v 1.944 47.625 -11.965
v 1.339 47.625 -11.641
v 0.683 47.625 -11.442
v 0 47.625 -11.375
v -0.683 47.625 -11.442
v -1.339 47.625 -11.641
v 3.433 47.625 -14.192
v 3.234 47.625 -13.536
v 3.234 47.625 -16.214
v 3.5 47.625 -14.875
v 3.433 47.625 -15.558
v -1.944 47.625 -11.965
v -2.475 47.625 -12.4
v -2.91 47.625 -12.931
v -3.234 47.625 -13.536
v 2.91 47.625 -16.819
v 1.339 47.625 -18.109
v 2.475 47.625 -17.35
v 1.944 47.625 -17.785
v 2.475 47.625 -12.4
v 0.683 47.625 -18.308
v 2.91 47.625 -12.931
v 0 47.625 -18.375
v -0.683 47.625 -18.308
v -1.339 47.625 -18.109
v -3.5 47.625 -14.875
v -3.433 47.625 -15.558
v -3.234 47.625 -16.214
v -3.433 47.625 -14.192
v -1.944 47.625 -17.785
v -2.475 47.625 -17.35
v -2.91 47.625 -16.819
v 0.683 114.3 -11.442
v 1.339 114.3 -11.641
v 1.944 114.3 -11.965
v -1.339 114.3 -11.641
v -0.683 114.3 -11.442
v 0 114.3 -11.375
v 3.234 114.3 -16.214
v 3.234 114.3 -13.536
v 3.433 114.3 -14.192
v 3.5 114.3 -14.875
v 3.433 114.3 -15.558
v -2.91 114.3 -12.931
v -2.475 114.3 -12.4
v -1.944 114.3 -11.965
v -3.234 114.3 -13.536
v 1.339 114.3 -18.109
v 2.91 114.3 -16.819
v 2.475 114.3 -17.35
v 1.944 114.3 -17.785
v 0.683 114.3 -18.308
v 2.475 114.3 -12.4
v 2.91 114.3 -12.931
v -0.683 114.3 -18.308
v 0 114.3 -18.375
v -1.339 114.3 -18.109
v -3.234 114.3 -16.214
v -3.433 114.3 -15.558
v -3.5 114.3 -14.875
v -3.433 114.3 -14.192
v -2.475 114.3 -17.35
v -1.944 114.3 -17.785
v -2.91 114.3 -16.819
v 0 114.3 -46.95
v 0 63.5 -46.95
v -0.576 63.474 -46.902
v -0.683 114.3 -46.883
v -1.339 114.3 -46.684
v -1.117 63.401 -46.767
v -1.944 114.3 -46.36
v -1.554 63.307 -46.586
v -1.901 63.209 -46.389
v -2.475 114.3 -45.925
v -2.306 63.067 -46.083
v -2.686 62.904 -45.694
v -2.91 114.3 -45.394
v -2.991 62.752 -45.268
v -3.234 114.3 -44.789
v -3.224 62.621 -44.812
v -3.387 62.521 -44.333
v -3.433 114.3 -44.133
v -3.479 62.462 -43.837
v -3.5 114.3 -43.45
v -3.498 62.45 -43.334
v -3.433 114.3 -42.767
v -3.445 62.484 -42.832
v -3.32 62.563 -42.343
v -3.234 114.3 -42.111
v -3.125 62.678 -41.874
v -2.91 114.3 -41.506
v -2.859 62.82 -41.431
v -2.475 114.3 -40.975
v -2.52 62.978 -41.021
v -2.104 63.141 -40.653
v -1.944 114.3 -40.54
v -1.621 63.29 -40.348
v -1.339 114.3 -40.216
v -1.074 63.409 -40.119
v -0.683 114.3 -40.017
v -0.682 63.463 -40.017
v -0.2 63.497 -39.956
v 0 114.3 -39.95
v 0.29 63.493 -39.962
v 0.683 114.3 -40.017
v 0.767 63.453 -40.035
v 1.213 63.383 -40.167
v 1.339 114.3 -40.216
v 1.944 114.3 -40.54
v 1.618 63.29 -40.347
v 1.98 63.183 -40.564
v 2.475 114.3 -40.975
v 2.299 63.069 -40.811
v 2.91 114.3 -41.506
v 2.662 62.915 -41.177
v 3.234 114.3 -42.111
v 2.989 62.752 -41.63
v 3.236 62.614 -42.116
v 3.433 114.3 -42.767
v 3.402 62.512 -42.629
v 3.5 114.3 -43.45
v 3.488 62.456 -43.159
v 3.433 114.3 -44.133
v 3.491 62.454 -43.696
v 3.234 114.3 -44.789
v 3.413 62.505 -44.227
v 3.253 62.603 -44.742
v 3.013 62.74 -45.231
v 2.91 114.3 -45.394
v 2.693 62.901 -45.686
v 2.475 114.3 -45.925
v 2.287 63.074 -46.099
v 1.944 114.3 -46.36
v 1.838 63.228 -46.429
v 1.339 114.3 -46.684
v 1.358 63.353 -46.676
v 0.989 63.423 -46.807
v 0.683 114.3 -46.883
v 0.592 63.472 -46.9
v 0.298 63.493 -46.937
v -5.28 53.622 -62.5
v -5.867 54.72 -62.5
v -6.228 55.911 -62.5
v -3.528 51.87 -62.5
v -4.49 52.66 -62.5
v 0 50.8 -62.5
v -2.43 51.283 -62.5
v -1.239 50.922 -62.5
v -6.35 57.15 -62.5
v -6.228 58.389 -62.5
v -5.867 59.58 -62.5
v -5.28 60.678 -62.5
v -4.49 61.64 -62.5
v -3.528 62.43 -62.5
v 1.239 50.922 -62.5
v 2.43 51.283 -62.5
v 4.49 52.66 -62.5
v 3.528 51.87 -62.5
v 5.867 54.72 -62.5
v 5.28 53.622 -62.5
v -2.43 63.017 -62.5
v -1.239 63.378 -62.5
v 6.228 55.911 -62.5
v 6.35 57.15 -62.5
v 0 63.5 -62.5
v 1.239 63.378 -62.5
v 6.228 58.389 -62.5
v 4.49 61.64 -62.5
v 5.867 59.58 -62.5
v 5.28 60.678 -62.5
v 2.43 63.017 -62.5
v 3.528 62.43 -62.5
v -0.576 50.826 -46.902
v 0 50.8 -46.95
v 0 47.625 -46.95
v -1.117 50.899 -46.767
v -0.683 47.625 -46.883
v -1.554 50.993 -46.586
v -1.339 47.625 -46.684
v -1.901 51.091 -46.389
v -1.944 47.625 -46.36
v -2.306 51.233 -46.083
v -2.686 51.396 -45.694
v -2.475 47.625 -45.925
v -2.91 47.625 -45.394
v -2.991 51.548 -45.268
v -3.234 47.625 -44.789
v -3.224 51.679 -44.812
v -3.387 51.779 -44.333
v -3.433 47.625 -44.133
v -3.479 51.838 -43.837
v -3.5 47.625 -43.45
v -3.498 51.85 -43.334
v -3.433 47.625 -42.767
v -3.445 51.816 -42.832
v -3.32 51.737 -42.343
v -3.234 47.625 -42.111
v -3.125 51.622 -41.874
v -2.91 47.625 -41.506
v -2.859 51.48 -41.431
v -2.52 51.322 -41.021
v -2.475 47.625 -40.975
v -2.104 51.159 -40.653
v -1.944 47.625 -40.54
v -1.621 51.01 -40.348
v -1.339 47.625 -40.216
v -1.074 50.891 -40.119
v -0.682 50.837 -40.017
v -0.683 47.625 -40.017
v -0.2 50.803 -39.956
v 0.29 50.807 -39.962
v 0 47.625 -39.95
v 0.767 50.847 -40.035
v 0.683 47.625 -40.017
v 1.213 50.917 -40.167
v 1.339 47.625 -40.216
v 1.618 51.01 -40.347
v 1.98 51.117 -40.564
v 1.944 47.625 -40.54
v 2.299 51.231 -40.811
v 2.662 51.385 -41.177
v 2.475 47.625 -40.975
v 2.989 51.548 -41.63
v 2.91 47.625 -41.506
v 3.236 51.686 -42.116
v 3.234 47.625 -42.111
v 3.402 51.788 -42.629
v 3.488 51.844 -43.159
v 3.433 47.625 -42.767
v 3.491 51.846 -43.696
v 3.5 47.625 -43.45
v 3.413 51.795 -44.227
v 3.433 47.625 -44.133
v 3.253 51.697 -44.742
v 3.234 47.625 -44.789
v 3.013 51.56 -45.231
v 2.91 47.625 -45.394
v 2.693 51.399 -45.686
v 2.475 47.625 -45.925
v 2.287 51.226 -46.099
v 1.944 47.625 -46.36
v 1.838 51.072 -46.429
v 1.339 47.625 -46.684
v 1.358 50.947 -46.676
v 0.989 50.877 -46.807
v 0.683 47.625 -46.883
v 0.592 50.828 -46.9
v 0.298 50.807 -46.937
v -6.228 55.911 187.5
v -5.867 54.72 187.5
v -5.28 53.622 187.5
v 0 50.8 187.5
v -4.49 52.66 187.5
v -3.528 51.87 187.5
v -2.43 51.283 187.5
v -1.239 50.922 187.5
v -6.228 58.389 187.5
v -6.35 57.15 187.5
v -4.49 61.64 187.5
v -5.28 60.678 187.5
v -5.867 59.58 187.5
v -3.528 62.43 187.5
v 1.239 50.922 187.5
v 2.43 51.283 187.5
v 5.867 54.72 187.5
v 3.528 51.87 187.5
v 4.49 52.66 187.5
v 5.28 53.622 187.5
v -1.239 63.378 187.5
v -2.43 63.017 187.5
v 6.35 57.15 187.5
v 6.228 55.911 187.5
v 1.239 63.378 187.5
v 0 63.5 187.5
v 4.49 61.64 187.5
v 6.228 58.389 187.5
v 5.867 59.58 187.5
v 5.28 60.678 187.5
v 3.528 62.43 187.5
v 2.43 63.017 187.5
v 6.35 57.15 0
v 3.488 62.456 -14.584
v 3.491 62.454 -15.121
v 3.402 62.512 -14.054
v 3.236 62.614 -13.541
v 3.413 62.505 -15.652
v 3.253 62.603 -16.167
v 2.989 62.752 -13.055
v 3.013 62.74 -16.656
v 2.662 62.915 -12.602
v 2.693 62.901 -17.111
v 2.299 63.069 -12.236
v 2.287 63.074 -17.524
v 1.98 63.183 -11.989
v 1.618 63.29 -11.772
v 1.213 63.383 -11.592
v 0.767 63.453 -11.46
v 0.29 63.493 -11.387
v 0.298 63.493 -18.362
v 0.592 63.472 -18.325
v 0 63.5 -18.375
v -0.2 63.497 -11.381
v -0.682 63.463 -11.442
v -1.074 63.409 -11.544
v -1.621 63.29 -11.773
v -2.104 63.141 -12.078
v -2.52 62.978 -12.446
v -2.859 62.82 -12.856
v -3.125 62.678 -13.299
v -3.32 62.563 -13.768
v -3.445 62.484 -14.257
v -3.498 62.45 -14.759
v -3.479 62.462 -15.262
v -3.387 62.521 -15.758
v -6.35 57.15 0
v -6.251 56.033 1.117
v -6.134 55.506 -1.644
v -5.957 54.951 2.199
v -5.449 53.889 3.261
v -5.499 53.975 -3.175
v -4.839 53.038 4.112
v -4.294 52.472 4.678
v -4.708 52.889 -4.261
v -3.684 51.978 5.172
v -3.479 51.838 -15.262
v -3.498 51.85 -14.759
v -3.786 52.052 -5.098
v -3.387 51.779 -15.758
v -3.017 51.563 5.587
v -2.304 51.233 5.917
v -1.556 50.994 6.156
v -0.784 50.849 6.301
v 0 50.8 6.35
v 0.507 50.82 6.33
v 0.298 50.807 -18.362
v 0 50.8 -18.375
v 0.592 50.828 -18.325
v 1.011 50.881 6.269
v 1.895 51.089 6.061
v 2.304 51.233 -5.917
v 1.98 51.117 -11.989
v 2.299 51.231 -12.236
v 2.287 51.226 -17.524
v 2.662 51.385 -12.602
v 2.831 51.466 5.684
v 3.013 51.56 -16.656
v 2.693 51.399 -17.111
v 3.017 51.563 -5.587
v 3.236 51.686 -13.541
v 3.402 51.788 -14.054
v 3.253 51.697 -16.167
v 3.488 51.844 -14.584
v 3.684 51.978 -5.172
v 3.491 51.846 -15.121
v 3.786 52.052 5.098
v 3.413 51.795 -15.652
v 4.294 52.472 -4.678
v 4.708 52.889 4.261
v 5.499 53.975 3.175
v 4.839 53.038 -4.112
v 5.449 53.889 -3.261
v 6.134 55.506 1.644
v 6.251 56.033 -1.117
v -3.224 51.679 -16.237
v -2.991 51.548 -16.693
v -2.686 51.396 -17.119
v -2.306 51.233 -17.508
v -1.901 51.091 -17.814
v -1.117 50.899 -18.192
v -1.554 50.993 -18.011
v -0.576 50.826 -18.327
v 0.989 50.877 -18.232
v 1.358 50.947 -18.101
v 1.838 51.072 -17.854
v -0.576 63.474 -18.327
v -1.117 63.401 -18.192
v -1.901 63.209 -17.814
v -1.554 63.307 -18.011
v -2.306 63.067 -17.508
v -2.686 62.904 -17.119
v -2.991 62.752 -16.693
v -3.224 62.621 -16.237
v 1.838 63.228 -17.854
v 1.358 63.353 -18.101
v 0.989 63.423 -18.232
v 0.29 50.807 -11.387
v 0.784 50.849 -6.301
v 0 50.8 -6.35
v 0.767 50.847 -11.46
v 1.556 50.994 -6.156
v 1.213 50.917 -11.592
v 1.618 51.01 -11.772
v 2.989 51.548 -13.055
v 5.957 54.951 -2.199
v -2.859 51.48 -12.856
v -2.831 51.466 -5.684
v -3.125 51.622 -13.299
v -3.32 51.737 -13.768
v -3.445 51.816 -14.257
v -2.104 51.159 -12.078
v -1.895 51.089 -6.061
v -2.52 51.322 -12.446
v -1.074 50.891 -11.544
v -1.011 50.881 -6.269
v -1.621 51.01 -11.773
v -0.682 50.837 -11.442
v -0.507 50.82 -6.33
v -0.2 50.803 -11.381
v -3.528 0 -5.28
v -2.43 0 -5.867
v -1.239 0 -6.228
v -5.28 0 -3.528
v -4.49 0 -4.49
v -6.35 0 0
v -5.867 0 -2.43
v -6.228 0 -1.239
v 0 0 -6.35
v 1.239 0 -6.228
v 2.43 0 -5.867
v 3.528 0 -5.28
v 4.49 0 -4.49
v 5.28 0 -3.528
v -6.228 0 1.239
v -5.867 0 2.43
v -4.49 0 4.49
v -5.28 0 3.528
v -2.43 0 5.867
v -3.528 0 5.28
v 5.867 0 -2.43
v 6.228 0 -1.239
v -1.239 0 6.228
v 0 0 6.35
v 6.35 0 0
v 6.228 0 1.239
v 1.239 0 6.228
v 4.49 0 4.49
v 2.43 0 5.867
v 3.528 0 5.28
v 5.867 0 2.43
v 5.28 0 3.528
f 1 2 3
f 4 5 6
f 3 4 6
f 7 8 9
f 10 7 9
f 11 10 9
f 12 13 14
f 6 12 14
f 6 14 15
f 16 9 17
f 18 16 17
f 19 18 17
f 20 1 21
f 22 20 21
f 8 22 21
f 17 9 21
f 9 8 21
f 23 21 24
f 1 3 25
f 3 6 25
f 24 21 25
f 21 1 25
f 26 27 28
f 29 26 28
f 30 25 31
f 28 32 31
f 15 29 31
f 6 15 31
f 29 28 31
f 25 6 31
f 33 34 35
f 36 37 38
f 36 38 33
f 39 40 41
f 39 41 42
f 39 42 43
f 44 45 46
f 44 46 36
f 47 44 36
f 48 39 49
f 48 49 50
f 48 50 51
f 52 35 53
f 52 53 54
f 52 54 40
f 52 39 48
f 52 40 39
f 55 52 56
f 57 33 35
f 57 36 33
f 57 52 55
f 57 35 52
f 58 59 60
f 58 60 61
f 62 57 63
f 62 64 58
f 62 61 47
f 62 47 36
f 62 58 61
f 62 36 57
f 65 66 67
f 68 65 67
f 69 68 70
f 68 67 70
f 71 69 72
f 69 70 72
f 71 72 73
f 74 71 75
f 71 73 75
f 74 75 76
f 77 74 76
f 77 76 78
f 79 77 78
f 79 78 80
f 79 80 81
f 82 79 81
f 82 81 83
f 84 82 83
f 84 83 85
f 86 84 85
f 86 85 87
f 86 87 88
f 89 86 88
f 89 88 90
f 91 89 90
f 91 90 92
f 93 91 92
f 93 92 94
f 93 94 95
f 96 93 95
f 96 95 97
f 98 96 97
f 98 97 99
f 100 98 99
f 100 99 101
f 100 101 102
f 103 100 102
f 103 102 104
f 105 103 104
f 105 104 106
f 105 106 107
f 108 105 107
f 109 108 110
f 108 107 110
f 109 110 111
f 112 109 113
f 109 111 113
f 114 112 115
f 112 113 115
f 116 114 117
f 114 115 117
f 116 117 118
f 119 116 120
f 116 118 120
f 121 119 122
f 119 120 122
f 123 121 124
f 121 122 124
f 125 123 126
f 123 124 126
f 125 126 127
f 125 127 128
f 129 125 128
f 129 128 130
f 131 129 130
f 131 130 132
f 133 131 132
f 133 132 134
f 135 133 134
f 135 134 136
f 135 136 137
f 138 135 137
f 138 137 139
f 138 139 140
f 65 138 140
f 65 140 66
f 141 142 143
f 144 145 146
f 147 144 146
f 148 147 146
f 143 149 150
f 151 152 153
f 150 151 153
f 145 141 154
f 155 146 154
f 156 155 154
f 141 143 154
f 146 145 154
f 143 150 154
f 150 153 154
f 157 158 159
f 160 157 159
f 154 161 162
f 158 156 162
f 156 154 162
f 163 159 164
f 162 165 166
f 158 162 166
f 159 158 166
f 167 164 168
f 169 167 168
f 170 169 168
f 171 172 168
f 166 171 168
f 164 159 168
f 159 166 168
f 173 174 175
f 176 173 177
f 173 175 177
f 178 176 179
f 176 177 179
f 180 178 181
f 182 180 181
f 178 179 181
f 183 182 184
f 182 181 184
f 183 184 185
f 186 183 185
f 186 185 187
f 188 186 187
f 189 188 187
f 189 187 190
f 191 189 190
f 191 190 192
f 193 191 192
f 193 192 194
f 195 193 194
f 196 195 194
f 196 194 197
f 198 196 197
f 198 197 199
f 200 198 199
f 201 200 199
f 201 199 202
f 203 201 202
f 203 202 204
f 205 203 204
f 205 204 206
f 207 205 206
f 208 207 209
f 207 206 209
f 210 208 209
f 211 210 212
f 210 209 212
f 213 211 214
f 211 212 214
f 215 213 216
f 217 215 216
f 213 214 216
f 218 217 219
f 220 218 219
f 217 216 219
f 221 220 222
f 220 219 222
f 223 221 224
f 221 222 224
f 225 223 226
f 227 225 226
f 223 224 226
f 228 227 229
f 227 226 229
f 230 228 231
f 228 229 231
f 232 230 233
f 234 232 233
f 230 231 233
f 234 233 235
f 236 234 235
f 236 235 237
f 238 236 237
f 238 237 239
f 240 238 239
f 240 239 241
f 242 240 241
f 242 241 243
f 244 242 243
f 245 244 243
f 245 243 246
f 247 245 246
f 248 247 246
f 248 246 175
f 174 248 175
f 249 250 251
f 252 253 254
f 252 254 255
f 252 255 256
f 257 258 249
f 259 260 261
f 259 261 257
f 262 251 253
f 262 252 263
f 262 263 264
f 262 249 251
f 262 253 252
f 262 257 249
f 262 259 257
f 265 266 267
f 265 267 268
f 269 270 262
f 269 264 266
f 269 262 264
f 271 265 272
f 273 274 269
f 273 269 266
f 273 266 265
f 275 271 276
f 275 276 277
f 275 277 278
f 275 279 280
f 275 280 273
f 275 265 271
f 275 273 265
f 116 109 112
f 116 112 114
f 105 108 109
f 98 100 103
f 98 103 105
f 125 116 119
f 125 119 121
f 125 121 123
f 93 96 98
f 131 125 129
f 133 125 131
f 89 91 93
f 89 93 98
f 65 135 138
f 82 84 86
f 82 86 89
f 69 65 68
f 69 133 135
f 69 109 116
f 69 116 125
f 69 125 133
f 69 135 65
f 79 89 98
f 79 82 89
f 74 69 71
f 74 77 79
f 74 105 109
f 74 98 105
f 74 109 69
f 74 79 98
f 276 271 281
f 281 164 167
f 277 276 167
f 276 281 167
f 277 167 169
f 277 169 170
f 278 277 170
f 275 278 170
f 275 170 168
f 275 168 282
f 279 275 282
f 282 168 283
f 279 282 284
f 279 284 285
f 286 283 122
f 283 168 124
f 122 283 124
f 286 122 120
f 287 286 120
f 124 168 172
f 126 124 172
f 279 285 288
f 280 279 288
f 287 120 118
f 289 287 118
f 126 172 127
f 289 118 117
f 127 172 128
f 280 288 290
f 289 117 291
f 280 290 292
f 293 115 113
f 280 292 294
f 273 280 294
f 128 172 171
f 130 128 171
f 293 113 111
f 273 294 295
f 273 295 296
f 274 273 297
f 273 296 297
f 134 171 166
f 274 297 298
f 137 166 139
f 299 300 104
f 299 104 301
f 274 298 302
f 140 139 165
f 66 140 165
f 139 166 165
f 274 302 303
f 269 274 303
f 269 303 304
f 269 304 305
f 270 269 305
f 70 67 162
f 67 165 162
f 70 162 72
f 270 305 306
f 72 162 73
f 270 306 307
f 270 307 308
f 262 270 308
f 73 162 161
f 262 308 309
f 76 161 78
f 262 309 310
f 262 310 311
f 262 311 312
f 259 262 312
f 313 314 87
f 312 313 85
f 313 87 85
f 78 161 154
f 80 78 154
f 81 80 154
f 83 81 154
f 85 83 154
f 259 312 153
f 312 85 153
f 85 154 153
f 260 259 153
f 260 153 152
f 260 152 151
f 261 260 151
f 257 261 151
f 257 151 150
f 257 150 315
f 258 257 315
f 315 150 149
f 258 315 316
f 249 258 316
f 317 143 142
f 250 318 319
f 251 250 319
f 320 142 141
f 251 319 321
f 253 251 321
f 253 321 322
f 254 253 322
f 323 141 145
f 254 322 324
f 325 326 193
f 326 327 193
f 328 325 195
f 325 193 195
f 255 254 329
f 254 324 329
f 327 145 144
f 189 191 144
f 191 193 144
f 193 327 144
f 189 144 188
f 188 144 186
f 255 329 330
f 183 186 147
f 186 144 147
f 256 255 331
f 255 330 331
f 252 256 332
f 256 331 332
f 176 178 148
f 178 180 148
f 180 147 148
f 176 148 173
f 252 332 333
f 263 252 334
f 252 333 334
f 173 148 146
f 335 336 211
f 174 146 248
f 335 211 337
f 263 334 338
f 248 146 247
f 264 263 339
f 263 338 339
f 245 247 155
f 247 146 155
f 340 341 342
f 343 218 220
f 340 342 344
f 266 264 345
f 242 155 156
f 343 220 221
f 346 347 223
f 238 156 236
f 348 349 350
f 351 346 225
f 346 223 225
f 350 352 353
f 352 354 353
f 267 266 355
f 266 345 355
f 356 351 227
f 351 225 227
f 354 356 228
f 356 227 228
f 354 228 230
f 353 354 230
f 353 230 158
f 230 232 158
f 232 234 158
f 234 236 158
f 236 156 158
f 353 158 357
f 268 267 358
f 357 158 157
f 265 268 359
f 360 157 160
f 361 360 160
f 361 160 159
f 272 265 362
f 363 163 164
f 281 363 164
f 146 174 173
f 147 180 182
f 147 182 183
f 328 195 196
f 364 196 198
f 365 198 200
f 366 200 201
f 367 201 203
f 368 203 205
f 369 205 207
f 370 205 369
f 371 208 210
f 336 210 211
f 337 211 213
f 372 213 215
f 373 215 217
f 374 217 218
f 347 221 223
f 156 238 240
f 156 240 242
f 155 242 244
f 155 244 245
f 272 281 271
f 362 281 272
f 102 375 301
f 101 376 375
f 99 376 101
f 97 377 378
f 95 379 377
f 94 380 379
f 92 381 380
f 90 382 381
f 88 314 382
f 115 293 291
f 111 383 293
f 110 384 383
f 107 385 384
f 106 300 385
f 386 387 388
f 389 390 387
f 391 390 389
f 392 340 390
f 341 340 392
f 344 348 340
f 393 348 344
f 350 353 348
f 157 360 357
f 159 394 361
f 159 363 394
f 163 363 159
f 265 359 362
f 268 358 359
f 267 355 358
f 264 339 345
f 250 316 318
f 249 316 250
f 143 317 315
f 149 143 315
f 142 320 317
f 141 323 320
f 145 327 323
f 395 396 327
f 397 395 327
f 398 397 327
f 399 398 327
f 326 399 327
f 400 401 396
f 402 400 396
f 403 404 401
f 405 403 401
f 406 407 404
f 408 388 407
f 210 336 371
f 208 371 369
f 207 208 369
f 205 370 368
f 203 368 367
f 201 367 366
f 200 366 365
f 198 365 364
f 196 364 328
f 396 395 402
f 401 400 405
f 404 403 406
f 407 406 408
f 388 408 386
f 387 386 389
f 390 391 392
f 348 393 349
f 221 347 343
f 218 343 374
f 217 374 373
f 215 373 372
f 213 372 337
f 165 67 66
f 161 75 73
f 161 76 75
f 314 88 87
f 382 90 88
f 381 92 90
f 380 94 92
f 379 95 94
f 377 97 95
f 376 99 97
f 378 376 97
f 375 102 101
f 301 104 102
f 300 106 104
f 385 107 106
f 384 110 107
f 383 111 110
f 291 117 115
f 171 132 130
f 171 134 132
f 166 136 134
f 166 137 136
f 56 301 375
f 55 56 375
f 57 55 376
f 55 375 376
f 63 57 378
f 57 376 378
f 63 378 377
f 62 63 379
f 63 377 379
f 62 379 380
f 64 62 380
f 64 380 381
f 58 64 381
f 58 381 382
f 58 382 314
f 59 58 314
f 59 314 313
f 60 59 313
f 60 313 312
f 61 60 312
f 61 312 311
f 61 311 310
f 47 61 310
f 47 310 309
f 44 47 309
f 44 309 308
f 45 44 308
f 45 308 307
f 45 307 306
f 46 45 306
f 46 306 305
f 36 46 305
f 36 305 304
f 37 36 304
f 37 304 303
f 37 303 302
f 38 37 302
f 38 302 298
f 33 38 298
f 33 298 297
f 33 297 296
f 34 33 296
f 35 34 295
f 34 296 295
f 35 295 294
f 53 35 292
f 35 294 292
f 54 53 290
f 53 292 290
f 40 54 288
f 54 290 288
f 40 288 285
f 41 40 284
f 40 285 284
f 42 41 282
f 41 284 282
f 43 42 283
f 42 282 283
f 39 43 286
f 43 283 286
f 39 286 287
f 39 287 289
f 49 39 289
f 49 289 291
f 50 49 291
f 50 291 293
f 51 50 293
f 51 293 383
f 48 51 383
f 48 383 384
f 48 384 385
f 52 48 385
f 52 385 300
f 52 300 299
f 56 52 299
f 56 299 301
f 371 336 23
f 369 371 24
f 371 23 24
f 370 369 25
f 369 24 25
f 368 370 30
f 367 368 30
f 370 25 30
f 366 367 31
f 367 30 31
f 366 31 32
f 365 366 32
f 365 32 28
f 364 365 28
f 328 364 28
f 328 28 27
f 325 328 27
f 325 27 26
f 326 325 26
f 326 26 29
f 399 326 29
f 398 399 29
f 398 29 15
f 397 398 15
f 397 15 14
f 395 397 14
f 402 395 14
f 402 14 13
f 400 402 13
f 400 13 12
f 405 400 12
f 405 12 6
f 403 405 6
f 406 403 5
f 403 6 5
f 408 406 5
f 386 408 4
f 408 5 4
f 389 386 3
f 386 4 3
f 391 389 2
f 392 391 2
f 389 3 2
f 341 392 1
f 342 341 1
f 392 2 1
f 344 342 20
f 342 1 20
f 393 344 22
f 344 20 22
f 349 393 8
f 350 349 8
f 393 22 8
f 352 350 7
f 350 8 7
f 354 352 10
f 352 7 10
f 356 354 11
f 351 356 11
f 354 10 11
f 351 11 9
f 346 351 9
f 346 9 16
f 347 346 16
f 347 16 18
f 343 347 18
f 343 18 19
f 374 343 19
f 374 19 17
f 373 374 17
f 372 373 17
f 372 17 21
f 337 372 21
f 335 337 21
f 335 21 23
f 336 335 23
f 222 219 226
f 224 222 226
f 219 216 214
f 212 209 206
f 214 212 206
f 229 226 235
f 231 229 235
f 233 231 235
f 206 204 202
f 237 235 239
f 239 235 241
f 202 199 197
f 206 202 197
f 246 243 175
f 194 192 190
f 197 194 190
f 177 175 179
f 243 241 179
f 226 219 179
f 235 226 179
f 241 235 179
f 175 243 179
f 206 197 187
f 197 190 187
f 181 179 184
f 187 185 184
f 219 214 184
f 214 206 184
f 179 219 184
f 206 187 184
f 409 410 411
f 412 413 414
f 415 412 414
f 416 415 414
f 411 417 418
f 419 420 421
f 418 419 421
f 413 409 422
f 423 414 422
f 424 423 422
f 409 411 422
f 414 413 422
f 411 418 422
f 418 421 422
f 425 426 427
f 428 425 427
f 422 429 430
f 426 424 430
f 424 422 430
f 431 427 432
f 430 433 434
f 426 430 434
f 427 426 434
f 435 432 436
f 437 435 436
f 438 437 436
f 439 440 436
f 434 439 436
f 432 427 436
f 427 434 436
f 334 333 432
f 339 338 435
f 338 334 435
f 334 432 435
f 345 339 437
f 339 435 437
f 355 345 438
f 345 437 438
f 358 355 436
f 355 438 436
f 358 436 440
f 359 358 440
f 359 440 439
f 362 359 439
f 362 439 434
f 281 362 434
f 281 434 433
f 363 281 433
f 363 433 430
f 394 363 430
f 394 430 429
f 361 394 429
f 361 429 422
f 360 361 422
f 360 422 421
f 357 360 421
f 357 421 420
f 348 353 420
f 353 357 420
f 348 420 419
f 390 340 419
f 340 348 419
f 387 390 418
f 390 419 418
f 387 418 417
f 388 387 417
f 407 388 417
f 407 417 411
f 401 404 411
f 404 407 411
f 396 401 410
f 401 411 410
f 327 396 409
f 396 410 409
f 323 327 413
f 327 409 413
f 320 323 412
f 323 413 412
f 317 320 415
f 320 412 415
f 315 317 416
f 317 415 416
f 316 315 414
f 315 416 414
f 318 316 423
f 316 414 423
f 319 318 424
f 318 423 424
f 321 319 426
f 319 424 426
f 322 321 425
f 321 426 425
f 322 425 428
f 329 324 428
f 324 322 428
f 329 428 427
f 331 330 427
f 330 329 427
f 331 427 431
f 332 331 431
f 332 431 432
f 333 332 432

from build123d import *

# Parameters (mm, degrees)
SKETCH1_R                = 6.35
BOSS_EXTRUDE1_DEPTH      = 57.15
BOSS_EXTRUDE2_DEPTH      = 187.5
BOSS_EXTRUDE2_DEPTH_BACK = 62.5
SKETCH2_R                = 6.35
BOSS_EXTRUDE3_START      = 47.625
SKETCH3_R                = 3.5
BOSS_EXTRUDE3_DEPTH      = 66.675


with BuildPart() as part:
    # Sketch1 → Boss-Extrude1 (new body)
    with BuildSketch(Plane(origin=(0, 0, 0), x_dir=(1, 0, 0), z_dir=(0, 1, 0))):
        with Locations(Location((0, 0, 0), (0, 0, 270))):
            Circle(SKETCH1_R)
    extrude(amount=BOSS_EXTRUDE1_DEPTH)

    # Sketch2 → Boss-Extrude2 (add, two sides: drawn at the far end of the back side and taken through both)
    with BuildSketch(Plane.XY.offset(-BOSS_EXTRUDE2_DEPTH_BACK)):
        with Locations((0, 57.15)):
            Circle(SKETCH2_R)
    extrude(amount=BOSS_EXTRUDE2_DEPTH + BOSS_EXTRUDE2_DEPTH_BACK)

    # Sketch3 → Boss-Extrude3 (add)
    with BuildSketch(Plane(origin=(0, 0, 0), x_dir=(1, 0, 0), z_dir=(0, 1, 0)).offset(BOSS_EXTRUDE3_START)):
        with Locations(Location((0, 14.875, 0), (0, 0, 90))):
            Circle(SKETCH3_R)
        with Locations(Location((0, 43.45, 0), (0, 0, 90))):
            Circle(SKETCH3_R)
    extrude(amount=BOSS_EXTRUDE3_DEPTH)


solid = part.part
